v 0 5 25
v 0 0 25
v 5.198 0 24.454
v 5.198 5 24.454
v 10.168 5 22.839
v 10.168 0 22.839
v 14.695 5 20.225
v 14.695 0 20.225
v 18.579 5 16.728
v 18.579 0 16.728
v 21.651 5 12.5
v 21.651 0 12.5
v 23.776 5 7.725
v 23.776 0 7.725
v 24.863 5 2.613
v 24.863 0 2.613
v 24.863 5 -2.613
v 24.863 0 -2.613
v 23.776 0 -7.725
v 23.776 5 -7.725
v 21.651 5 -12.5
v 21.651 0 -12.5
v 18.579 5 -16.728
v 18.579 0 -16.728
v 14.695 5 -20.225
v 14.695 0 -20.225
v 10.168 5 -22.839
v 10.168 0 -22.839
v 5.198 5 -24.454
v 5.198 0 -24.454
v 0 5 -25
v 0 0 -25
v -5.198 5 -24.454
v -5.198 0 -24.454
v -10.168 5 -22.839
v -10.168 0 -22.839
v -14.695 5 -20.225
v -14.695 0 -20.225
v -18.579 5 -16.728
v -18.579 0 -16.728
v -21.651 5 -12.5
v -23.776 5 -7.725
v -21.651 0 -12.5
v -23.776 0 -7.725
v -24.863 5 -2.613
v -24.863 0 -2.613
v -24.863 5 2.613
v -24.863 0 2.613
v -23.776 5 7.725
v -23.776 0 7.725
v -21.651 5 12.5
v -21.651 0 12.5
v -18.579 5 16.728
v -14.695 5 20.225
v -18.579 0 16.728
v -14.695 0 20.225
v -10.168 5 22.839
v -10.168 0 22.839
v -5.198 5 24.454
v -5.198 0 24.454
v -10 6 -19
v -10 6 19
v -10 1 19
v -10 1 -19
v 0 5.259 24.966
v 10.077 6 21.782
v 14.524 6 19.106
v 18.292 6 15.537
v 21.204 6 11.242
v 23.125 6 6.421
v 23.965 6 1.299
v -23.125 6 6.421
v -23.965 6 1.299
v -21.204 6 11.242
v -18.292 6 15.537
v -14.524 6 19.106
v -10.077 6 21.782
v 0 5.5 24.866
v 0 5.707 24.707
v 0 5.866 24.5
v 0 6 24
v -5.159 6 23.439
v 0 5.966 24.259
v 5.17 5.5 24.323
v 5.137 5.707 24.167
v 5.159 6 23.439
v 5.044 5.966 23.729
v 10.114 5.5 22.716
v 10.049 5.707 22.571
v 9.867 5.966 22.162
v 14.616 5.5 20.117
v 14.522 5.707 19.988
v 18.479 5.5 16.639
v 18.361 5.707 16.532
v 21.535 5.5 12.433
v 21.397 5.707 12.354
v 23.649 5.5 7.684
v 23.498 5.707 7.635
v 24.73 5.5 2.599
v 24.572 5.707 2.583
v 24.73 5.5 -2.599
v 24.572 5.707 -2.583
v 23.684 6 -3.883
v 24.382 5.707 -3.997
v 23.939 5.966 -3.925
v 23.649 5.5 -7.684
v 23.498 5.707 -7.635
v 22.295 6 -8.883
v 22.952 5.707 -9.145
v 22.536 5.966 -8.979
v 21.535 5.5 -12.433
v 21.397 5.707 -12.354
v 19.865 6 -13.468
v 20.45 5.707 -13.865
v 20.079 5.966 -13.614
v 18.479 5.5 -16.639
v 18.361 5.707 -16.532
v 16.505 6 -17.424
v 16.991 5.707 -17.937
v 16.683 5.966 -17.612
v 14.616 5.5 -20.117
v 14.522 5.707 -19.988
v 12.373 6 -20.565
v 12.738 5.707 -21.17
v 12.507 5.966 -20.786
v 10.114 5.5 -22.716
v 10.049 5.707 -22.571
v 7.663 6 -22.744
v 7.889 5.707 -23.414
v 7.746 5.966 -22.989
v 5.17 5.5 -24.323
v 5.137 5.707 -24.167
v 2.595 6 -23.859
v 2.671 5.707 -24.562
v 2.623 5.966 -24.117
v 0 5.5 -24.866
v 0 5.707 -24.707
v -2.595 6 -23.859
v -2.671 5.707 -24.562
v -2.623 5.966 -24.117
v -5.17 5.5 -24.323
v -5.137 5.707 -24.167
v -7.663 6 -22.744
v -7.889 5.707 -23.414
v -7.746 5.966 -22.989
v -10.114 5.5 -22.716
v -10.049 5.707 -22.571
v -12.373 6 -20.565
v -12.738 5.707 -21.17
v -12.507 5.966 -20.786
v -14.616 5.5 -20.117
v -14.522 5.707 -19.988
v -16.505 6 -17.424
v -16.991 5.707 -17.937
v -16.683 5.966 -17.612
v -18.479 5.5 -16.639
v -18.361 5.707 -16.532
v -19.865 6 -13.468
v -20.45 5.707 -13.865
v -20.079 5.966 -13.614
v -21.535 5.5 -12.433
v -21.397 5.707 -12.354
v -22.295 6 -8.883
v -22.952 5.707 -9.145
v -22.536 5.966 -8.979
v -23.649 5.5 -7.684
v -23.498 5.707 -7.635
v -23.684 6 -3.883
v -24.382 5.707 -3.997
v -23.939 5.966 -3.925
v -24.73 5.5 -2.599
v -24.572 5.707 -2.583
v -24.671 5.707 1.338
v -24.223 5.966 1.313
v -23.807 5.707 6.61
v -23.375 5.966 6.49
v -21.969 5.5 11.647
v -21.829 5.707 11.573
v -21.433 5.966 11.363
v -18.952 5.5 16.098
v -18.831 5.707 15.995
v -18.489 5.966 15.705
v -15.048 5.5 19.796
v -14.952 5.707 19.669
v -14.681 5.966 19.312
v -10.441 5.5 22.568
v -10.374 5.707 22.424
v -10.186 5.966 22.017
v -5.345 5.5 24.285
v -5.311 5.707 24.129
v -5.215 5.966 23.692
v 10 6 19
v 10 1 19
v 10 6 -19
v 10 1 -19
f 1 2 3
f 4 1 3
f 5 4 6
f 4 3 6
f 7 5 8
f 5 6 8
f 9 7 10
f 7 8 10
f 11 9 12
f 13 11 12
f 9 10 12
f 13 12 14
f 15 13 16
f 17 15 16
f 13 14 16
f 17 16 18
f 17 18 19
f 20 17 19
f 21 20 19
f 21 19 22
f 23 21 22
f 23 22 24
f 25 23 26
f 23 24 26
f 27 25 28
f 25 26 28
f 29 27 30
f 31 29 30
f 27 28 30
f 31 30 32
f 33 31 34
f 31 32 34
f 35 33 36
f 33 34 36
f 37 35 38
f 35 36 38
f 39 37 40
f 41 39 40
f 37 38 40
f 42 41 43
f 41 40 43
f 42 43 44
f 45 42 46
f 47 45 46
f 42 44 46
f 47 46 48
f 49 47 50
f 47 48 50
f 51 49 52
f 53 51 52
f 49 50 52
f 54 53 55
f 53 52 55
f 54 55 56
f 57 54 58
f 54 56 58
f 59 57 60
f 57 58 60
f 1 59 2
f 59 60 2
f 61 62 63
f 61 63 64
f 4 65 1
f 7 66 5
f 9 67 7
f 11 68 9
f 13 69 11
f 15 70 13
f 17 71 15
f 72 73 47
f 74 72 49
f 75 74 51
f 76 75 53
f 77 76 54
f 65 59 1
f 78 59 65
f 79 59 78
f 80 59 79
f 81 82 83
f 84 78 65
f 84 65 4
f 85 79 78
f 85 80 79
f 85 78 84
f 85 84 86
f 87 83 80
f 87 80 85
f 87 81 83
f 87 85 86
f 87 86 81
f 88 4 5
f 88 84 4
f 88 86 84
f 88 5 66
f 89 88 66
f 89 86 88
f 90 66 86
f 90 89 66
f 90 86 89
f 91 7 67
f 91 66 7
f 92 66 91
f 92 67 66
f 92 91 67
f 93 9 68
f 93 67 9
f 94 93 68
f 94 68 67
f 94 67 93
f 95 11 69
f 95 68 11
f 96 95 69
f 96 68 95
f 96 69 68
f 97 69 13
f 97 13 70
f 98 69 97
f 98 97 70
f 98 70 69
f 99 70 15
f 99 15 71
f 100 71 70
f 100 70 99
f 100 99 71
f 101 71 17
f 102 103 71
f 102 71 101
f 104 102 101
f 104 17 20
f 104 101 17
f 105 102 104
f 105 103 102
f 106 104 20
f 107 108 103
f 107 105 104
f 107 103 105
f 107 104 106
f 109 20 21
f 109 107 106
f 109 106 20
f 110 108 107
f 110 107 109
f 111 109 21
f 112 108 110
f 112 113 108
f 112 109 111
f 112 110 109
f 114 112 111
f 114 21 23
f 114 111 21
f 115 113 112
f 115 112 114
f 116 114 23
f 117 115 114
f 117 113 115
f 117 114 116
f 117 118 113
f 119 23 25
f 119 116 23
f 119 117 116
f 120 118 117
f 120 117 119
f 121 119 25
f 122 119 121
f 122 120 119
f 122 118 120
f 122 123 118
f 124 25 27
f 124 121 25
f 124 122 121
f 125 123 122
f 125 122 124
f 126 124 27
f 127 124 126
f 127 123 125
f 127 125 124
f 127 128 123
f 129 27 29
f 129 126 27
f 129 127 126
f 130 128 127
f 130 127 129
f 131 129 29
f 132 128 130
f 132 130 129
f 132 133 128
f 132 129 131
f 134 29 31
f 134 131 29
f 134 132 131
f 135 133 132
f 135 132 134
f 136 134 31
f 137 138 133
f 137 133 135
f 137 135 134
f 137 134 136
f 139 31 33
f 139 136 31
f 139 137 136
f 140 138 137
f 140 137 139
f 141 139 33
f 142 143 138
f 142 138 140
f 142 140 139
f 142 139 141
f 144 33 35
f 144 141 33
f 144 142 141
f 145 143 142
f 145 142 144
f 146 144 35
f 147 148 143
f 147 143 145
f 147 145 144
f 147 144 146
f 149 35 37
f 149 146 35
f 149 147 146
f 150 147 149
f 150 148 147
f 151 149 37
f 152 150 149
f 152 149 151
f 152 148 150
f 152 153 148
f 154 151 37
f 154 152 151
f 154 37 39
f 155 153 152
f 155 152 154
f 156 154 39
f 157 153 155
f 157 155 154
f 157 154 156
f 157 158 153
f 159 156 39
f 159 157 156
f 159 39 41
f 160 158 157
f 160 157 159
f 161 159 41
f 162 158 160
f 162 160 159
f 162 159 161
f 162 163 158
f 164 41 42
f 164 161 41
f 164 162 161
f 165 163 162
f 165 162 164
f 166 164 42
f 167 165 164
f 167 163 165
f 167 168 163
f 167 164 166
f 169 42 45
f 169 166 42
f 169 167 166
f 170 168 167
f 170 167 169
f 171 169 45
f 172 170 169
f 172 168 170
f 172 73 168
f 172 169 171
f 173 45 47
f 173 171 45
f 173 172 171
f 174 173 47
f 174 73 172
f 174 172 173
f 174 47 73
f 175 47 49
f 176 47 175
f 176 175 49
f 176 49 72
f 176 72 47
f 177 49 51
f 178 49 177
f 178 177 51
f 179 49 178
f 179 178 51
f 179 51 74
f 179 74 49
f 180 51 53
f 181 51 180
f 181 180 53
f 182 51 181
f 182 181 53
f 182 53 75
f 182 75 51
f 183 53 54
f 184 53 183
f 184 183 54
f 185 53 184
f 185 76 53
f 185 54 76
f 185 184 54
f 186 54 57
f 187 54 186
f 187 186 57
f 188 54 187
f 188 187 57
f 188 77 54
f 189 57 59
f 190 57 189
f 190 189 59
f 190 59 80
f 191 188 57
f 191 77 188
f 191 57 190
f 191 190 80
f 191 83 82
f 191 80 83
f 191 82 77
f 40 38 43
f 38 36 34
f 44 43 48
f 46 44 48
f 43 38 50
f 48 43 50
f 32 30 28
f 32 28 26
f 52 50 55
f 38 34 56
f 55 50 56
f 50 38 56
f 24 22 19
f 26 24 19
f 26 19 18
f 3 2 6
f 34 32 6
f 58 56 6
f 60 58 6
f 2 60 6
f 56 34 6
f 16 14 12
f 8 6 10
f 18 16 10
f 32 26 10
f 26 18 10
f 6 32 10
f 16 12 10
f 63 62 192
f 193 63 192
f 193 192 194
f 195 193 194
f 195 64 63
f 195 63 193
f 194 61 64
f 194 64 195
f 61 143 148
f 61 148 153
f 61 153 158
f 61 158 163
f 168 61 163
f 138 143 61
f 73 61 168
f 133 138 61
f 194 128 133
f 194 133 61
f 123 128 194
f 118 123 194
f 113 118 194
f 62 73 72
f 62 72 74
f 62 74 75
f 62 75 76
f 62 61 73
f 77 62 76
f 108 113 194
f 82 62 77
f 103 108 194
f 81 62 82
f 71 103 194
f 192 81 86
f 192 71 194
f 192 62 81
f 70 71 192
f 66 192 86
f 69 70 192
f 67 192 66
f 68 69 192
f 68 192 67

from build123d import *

# Parameters (mm, degrees)
SKETCH1_R           = 25
BOSS_EXTRUDE1_DEPTH = 6
SKETCH2_W           = 20
SKETCH2_H           = 38
CUT_EXTRUDE1_DEPTH  = 5
FILLET1_R           = 1


with BuildPart() as part:
    # Sketch1 → Boss-Extrude1 (new body)
    with BuildSketch(Plane(origin=(0, 0, 0), x_dir=(1, 0, 0), z_dir=(0, 1, 0))):
        with Locations(Location((0, 0, 0), (0, 0, 270))):
            Circle(SKETCH1_R)
    extrude(amount=BOSS_EXTRUDE1_DEPTH)

    # Sketch2 → Cut-Extrude1 (cut)
    with BuildSketch(Plane(origin=(0, 6, 0), x_dir=(1, 0, 0), z_dir=(0, 1, 0))):
        Rectangle(SKETCH2_W, SKETCH2_H)
    extrude(amount=-CUT_EXTRUDE1_DEPTH, mode=Mode.SUBTRACT)

    # Fillet1
    fillet1_edges = [part.edges().sort_by_distance(p)[0] for p in [
        (0, 6, -25),
    ]]
    fillet(fillet1_edges, radius=FILLET1_R)


solid = part.part
